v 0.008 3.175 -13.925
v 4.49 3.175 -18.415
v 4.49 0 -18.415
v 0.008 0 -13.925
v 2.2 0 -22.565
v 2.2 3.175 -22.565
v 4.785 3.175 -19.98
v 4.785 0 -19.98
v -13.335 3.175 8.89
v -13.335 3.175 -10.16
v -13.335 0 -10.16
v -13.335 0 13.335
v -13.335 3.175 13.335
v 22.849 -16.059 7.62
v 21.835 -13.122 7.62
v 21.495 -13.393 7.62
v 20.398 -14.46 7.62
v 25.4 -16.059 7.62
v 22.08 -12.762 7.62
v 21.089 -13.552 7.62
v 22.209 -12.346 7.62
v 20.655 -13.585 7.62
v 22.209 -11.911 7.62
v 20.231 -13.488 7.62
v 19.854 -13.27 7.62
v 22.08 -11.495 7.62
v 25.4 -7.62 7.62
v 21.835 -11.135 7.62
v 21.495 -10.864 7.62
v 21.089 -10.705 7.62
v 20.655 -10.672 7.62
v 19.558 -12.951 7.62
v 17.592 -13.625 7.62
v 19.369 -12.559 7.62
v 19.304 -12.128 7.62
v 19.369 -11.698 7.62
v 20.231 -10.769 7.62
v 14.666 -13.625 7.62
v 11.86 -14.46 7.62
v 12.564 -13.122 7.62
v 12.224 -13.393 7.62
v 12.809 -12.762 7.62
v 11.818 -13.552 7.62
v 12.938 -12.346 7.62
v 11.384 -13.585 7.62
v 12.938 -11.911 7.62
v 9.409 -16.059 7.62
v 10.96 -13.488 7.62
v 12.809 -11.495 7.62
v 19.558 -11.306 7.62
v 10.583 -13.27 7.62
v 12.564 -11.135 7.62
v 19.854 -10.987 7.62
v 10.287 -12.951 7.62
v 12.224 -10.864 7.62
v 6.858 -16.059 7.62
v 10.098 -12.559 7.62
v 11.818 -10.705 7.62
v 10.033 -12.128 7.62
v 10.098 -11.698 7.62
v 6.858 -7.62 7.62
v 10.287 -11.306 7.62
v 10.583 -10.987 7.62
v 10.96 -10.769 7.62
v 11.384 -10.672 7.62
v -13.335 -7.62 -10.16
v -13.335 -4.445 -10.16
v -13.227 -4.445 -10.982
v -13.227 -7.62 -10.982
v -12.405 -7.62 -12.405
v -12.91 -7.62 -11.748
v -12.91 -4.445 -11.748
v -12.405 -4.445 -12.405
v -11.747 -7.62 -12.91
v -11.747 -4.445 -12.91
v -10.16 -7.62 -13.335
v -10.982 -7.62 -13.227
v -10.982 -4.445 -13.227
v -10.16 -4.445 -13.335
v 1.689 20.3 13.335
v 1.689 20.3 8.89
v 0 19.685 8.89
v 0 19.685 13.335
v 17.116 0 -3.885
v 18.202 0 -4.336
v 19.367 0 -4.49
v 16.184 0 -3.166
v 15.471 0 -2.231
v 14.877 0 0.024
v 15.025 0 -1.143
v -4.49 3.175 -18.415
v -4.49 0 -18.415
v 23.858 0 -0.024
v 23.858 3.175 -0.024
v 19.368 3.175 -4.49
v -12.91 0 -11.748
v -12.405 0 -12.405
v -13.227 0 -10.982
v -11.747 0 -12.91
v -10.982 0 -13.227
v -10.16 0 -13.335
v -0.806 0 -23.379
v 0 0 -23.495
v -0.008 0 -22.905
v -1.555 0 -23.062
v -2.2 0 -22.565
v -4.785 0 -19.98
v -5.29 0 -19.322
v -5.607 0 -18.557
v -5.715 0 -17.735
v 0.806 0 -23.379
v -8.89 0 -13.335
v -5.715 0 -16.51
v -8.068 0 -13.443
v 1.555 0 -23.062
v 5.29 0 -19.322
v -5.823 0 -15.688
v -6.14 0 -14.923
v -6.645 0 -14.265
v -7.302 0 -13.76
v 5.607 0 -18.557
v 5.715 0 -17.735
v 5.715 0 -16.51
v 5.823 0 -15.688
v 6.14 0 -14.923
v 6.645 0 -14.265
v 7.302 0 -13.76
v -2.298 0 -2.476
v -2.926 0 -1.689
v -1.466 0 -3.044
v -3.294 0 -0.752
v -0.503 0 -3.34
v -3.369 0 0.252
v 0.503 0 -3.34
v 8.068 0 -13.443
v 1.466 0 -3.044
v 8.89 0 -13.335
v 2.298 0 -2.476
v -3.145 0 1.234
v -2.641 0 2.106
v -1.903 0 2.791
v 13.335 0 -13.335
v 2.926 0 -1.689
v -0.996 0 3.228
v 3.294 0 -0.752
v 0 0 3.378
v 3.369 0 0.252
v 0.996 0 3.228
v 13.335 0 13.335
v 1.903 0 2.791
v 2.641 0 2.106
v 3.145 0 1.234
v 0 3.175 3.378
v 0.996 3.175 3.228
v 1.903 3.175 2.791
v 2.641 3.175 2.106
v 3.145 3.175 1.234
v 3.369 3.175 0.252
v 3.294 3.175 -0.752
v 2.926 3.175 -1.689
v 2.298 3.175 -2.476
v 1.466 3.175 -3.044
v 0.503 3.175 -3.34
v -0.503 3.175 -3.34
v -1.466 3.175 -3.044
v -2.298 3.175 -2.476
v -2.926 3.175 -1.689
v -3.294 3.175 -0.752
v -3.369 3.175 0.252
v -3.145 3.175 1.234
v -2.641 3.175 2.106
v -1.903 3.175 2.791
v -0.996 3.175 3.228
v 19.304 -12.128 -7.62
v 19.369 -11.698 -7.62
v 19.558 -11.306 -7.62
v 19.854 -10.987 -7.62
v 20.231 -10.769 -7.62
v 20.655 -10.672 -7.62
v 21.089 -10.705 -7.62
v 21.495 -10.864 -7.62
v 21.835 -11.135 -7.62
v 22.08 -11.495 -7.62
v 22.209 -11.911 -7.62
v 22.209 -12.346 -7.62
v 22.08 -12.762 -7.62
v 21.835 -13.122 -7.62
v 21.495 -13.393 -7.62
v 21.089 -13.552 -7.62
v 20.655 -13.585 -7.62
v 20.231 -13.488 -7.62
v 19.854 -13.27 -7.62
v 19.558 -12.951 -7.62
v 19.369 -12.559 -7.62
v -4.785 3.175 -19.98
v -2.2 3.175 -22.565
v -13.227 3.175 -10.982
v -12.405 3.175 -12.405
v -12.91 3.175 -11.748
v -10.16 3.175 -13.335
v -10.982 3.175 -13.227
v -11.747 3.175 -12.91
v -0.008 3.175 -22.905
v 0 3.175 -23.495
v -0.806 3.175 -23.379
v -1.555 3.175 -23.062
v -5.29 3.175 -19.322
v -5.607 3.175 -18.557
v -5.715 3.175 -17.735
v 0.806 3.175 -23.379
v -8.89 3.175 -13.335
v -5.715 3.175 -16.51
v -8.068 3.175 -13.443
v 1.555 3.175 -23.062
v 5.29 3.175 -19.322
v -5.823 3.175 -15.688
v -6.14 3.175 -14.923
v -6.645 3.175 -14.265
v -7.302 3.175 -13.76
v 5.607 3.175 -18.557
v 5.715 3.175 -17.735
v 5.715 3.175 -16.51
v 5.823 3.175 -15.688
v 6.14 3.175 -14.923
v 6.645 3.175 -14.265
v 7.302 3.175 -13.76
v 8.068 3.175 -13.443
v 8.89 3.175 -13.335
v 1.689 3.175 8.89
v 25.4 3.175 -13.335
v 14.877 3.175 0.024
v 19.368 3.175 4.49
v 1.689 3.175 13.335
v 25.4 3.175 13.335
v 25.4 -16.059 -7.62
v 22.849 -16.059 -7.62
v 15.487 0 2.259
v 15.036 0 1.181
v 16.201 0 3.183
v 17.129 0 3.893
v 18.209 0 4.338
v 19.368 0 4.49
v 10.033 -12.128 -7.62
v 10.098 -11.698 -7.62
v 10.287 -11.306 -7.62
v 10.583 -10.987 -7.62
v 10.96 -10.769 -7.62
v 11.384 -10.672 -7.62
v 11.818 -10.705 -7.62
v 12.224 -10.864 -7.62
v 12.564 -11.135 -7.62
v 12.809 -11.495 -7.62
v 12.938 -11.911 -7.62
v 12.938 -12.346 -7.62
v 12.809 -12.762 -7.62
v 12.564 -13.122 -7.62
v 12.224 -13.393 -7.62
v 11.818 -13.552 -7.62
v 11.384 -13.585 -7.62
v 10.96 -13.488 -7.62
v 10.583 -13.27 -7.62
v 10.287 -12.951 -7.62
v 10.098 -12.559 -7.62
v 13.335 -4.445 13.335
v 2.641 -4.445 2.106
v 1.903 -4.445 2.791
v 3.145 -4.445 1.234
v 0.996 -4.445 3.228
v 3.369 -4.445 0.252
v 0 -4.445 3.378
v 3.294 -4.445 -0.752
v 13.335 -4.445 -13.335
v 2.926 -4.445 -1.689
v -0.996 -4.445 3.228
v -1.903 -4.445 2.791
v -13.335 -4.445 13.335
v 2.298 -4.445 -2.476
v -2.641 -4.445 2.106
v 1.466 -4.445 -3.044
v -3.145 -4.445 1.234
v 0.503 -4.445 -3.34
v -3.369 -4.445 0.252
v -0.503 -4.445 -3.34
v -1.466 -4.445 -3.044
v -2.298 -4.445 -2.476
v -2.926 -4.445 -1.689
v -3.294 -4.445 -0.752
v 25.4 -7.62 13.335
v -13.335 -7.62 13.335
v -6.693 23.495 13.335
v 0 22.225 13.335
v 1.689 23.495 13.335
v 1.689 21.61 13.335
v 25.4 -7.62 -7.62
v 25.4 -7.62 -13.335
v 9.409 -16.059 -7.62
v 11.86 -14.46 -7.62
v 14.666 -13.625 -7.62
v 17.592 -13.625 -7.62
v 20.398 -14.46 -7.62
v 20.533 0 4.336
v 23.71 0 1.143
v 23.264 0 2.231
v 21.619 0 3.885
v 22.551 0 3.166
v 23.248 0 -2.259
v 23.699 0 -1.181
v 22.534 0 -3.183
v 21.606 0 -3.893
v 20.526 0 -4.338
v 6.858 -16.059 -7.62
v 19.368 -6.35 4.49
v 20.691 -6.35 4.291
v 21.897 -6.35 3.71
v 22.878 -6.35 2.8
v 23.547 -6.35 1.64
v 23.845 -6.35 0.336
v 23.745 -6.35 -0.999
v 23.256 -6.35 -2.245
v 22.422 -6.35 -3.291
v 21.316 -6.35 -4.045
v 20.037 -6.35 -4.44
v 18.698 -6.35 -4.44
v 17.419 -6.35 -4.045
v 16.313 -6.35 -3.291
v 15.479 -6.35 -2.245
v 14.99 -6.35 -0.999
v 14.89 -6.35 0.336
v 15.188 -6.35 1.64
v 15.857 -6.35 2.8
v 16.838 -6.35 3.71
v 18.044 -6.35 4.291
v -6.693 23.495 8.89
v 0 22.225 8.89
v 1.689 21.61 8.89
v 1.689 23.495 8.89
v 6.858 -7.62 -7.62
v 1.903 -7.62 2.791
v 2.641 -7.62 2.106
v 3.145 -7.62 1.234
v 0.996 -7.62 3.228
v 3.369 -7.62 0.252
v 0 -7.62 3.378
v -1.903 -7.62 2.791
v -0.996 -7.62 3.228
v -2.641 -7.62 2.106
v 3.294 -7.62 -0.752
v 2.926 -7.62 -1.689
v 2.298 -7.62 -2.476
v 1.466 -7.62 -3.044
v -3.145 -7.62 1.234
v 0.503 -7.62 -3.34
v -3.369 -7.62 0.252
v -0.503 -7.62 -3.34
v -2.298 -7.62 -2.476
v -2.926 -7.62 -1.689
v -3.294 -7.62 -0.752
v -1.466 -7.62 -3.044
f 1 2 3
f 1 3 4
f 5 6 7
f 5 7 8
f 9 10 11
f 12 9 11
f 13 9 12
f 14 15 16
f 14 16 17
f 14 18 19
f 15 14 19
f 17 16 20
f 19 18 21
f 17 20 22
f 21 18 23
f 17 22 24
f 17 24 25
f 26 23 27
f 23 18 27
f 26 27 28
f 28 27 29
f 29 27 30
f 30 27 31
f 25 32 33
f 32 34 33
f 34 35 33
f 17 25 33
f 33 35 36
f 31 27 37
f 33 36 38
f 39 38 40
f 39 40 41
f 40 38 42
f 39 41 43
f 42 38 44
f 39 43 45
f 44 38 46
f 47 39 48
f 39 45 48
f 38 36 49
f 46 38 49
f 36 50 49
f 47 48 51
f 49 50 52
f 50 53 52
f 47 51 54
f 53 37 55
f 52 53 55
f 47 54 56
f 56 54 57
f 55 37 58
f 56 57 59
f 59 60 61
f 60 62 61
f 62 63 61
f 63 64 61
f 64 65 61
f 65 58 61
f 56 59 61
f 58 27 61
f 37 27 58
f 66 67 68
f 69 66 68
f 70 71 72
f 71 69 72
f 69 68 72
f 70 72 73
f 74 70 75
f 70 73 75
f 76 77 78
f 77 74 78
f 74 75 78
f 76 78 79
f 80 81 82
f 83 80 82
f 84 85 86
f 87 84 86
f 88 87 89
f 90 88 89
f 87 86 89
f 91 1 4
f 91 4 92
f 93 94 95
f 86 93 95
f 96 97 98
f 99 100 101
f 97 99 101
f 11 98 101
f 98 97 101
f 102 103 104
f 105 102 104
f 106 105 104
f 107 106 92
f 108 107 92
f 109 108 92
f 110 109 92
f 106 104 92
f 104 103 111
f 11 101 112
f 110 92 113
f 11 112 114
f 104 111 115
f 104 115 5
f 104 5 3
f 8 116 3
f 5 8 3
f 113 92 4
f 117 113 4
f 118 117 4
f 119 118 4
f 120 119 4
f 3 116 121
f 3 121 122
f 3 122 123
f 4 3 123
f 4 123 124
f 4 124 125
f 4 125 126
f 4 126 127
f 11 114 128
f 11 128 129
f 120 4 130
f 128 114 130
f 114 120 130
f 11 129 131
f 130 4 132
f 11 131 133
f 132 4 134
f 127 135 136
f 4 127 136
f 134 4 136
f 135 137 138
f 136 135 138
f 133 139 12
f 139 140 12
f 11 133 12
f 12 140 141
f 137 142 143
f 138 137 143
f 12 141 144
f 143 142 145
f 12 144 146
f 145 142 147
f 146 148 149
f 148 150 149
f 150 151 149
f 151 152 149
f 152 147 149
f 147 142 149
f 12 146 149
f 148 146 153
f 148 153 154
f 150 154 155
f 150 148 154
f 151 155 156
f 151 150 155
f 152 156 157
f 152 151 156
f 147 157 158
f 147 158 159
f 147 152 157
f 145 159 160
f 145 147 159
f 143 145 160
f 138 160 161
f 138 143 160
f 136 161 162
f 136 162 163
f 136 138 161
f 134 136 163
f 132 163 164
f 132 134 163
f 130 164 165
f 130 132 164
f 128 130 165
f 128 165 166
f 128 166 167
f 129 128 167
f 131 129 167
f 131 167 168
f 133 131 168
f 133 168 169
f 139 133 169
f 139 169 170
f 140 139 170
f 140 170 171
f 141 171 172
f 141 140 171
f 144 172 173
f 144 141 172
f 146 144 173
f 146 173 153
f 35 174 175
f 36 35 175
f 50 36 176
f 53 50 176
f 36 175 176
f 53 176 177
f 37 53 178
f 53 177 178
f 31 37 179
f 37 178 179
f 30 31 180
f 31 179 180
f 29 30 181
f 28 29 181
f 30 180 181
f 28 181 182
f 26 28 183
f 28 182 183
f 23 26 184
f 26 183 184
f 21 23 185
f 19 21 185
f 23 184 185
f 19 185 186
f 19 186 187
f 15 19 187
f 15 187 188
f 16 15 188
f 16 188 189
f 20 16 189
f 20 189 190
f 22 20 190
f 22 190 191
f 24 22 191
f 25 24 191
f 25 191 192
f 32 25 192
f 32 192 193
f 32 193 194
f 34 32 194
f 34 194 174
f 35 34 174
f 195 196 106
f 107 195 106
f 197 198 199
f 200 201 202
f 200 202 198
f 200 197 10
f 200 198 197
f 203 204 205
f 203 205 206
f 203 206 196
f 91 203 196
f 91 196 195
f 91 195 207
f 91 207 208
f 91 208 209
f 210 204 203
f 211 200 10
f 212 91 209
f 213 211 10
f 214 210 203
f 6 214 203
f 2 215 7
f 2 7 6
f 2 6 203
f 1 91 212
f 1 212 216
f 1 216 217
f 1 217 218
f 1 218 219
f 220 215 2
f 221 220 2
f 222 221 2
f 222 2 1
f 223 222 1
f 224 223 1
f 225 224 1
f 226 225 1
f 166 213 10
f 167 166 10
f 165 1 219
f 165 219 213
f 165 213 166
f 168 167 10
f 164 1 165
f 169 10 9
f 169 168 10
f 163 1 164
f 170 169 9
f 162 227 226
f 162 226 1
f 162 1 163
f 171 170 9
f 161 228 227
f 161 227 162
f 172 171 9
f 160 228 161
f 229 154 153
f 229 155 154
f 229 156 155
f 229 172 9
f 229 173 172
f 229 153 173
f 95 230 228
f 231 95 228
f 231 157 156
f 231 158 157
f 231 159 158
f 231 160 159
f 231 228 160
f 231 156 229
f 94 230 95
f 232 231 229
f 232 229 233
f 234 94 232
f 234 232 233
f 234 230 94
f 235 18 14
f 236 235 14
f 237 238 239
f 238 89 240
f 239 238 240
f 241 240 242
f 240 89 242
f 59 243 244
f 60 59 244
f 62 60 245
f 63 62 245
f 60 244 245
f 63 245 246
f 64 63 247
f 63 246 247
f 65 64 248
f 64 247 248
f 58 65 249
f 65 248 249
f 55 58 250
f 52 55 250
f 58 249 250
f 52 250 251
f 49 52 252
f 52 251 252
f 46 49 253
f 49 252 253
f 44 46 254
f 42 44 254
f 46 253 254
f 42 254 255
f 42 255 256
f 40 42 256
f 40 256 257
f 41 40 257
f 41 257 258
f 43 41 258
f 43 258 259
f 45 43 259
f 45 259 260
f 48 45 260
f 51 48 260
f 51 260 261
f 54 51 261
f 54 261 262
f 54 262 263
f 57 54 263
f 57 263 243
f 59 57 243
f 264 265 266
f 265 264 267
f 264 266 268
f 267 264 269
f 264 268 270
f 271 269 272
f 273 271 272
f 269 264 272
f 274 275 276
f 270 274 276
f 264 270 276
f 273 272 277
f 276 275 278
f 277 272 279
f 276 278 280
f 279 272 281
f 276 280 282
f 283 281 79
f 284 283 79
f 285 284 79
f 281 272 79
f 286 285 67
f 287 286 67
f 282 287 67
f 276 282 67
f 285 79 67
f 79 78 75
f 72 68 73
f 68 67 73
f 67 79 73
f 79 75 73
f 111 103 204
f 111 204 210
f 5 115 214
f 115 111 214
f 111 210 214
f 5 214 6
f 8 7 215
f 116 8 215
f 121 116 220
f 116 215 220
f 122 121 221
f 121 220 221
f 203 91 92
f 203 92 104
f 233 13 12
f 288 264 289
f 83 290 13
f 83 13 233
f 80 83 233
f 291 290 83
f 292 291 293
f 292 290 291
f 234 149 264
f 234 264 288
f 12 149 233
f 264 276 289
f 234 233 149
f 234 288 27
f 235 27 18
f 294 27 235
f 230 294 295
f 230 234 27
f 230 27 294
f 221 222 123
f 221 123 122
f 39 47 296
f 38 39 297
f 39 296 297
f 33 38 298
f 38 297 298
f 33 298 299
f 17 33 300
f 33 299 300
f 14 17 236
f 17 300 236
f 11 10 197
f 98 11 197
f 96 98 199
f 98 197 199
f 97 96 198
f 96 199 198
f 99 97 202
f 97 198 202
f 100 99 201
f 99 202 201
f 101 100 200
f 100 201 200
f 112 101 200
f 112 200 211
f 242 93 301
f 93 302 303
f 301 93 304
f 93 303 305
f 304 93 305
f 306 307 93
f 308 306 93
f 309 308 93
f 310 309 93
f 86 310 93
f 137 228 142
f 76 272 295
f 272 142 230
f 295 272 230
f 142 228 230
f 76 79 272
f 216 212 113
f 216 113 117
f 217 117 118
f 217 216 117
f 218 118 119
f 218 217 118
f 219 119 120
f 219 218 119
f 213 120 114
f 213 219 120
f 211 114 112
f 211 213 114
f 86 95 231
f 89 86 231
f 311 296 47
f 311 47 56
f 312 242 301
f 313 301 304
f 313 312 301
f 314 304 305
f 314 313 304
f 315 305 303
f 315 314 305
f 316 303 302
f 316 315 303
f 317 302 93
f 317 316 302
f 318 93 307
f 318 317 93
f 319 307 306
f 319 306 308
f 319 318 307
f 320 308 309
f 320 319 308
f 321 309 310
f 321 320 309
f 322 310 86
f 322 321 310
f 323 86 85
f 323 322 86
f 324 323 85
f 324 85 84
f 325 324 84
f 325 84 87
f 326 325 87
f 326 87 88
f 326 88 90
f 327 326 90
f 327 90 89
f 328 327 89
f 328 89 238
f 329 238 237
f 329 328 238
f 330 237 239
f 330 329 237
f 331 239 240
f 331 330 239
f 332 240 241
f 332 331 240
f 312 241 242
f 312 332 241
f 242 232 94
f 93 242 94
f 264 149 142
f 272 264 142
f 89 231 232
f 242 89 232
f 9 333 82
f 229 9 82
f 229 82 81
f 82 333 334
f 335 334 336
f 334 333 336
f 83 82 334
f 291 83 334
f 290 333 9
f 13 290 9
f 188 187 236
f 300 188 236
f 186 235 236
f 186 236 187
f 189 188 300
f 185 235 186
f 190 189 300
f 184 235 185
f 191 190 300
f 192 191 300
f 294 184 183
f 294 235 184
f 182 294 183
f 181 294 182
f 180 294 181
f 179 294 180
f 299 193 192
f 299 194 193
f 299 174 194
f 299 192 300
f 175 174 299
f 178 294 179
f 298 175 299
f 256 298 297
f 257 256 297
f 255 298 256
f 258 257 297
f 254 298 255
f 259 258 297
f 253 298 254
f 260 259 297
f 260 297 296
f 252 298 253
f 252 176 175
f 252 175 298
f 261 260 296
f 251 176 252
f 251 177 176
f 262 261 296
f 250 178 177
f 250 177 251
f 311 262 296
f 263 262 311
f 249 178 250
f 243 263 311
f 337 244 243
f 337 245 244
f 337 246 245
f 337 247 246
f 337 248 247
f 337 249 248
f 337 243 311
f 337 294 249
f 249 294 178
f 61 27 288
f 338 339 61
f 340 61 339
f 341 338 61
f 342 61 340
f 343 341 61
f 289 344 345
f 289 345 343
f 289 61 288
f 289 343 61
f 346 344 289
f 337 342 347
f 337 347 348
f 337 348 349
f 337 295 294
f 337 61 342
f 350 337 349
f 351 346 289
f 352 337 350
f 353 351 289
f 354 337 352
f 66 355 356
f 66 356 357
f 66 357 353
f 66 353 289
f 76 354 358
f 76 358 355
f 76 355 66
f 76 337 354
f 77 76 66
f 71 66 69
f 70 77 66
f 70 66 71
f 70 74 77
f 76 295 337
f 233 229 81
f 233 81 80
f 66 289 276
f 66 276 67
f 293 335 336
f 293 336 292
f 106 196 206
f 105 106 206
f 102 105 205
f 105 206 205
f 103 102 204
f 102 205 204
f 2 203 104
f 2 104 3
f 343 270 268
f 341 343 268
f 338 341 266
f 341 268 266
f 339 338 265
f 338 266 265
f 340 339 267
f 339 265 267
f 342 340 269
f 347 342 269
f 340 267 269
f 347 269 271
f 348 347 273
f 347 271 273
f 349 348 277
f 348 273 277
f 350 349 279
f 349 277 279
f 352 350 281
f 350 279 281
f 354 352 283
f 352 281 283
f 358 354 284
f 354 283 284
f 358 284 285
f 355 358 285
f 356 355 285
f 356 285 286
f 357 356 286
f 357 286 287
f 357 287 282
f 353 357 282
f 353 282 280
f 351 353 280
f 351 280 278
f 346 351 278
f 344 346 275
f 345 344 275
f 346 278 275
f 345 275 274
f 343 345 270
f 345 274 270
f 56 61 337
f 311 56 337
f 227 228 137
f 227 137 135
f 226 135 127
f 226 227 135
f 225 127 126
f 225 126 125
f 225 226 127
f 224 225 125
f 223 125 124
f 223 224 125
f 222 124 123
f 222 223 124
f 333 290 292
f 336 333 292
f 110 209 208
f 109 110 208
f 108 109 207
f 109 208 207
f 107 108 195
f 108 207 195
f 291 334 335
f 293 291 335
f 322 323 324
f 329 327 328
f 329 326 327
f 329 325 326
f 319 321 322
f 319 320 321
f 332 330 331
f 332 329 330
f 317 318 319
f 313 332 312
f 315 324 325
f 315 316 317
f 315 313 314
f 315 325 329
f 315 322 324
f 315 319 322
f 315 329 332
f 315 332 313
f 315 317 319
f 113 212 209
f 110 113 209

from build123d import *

# Parameters (mm, degrees)
SKETCH1_R            = 3.3782
BOSS_EXTRUDE1_DEPTH  = 3.175
BOSS_EXTRUDE2_DEPTH  = 4.445
SKETCH7_W            = 18.542
SKETCH7_H            = 15.24
BOSS_EXTRUDE4_DEPTH  = 8.43915
SKETCH8_R            = 1.4605
CUT_EXTRUDE3_DEPTH   = 37.635615509
SKETCH9_R            = 10.16
CUT_EXTRUDE4_DEPTH   = 37.635615509
CUT_EXTRUDE6_DEPTH   = 9.525
SKETCH23_R           = 4.490128061
CUT_EXTRUDE7_DEPTH   = 6.35
BOSS_EXTRUDE10_DEPTH = 3.175
BOSS_EXTRUDE11_DEPTH = 3.175
SKETCH19_W           = 8.382
SKETCH19_H           = 4.445
BOSS_EXTRUDE12_DEPTH = 20.32
BOSS_EXTRUDE13_DEPTH = 4.445
CUT_EXTRUDE5_DEPTH   = 12.7
SKETCH24_W           = 48.736365122
SKETCH24_H           = 10.862134757
CUT_EXTRUDE8_DEPTH   = 30.48
SKETCH26_W           = 11.43
SKETCH26_H           = 10.16
BOSS_EXTRUDE15_DEPTH = 3.175
CHAMFER1_SIZE        = 4.445
FILLET1_R            = 3.175


with BuildPart() as part:
    # Sketch1 → Boss-Extrude1 (new body)
    with BuildSketch(Plane(origin=(0, 0, 0), x_dir=(1, 0, 0), z_dir=(0, 1, 0))):
        with BuildLine():
            Line((0, -13.335), (25.4, -13.335))
            Line((25.4, -13.335), (25.4, 13.335))
            Line((25.4, 13.335), (0, 13.335))
            ThreePointArc((0, 13.335), (-13.335, 0), (0, -13.335))
        make_face()
        with Locations(Location((0, 0, 0), (0, 0, 270))):
            Circle(SKETCH1_R, mode=Mode.SUBTRACT)
    boss_extrude1 = extrude(amount=BOSS_EXTRUDE1_DEPTH)

    # Sketch2 → Boss-Extrude2 (add)
    with BuildSketch(Plane(origin=(0, 0, 0), x_dir=(-1, 0, 0), z_dir=(0, -1, 0))):
        Polygon((-25.4, 13.335), (-25.4, -13.335), (-13.335, -13.335), (-13.335, 0), (-13.335, 13.335), align=None)
    extrude(amount=BOSS_EXTRUDE2_DEPTH)

    # Mirror2: Boss-Extrude1 across plane
    add(boss_extrude1.mirror(Plane(origin=(0, -2.2225, 0), x_dir=(0, 0, 1), z_dir=(0, -1, 0))))

    # Sketch7 → Boss-Extrude4 (add)
    with BuildSketch(Plane(origin=(0, -7.62, 0), x_dir=(-1, 0, 0), z_dir=(0, -1, 0))):
        with Locations((-16.129, 0)):
            Rectangle(SKETCH7_W, SKETCH7_H)
    extrude(amount=BOSS_EXTRUDE4_DEPTH)

    # Sketch8 → Cut-Extrude3 (cut, through all)
    with BuildSketch(Plane(origin=(0, 0, -7.62), x_dir=(-1, 0, 0), z_dir=(0, 0, -1))):
        with Locations((-20.7645, -12.1285)):
            Circle(SKETCH8_R)
        with Locations((-11.4935, -12.1285)):
            Circle(SKETCH8_R)
    extrude(amount=-CUT_EXTRUDE3_DEPTH, mode=Mode.SUBTRACT)

    # Sketch9 → Cut-Extrude4 (cut, through all)
    with BuildSketch(Plane(origin=(0, 0, -7.62), x_dir=(-1, 0, 0), z_dir=(0, 0, -1))):
        with Locations((-16.129, -23.67915)):
            Circle(SKETCH9_R)
    extrude(amount=-CUT_EXTRUDE4_DEPTH, mode=Mode.SUBTRACT)

    # Sketch22 → Cut-Extrude6 (cut)
    with BuildSketch(Plane(origin=(0, 3.175, 0), x_dir=(1, 0, 0), z_dir=(0, 1, 0))):
        Polygon((19.3675, -4.490128061), (23.857563833, 0.024016226), (19.3675, 4.490128061), (14.877436167, -0.024016226), align=None)
    extrude(amount=-CUT_EXTRUDE6_DEPTH, mode=Mode.SUBTRACT)

    # Sketch23 → Cut-Extrude7 (cut)
    with BuildSketch(Plane(origin=(0, -6.35, 0), x_dir=(1, 0, 0), z_dir=(0, 1, 0))):
        with Locations(Location((19.3675, 0, 0), (0, 0, 270))):
            Circle(SKETCH23_R)
    extrude(amount=CUT_EXTRUDE7_DEPTH, mode=Mode.SUBTRACT)

    # Sketch16 → Boss-Extrude10 (add)
    with BuildSketch(Plane(origin=(0, 3.175, 0), x_dir=(1, 0, 0), z_dir=(0, 1, 0))):
        Polygon((0, 13.335), (-13.335, 0), (-13.335, 13.335), align=None)
    boss_extrude10 = extrude(amount=-BOSS_EXTRUDE10_DEPTH)

    # Sketch17 → Boss-Extrude11 (add)
    with BuildSketch(Plane.XZ.offset(7.62)):
        Polygon((-13.335, -13.335), (-13.335, 0), (0, -13.335), align=None)
    boss_extrude11 = extrude(amount=-BOSS_EXTRUDE11_DEPTH)

    # Sketch19 → Boss-Extrude12 (add)
    with BuildSketch(Plane(origin=(0, 3.175, 0), x_dir=(1, 0, 0), z_dir=(0, 1, 0))):
        with Locations((-2.5019, 11.1125)):
            Rectangle(SKETCH19_W, SKETCH19_H)
    boss_extrude12 = extrude(amount=BOSS_EXTRUDE12_DEPTH)

    # Sketch20 → Boss-Extrude13 (add)
    with BuildSketch(Plane.XY.offset(-8.89)):
        Polygon((-6.6929, 23.495), (-13.335, 3.175), (-6.6929, 3.175), align=None)
    boss_extrude13 = extrude(amount=-BOSS_EXTRUDE13_DEPTH)

    # Sketch21 → Cut-Extrude5 (cut)
    with BuildSketch(Plane.XY.offset(-8.89)):
        Polygon((0, 22.225), (1.6891, 21.610217877), (1.6891, 20.299782123), (0, 19.685), align=None)
    cut_extrude5 = extrude(amount=-CUT_EXTRUDE5_DEPTH, mode=Mode.SUBTRACT)

    # Mirror3: Boss-Extrude10, Boss-Extrude11, Boss-Extrude12, Boss-Extrude13, Cut-Extrude5 across plane
    add(boss_extrude10.mirror(Plane.XY))
    add(boss_extrude11.mirror(Plane.XY))
    add(boss_extrude12.mirror(Plane.XY))
    add(boss_extrude13.mirror(Plane.XY))
    add(cut_extrude5.mirror(Plane.XY), mode=Mode.SUBTRACT)

    # Sketch24 → Cut-Extrude8 (cut)
    with BuildSketch(Plane(origin=(0, 3.175, 0), x_dir=(1, 0, 0), z_dir=(0, 1, 0))):
        with Locations((2.598122841, 11.203809408)):
            Rectangle(SKETCH24_W, SKETCH24_H)
    extrude(amount=CUT_EXTRUDE8_DEPTH, mode=Mode.SUBTRACT)

    # Sketch26 → Boss-Extrude15 (add)
    with BuildSketch(Plane(origin=(0, 3.175, 0), x_dir=(1, 0, 0), z_dir=(0, 1, 0))):
        with Locations((0, 18.415)):
            Rectangle(SKETCH26_W, SKETCH26_H)
        Polygon((4.490128061, 18.415), (0.007864628, 13.924878827), (-4.490128061, 18.415), (-0.007864628, 22.905121173), align=None, mode=Mode.SUBTRACT)
    extrude(amount=-BOSS_EXTRUDE15_DEPTH)

    # Chamfer1
    chamfer1_edges = [part.edges().sort_by_distance(p)[0] for p in [
        (5.715, 1.5875, -23.495),
        (-5.715, 1.5875, -23.495),
    ]]
    chamfer(chamfer1_edges, length=CHAMFER1_SIZE)

    # Fillet1
    # the kernel refuses this fillet: 3.175 mm, written as the material it adds along each edge
    with BuildSketch(Plane(origin=(-5.715, 3.175, -13.335), x_dir=(0, 0, -1), z_dir=(0, -1, 0))) as fillet1_piece_1:
        with BuildLine():
            CenterArc((FILLET1_R, -FILLET1_R), FILLET1_R, 90, 90)
            Line((0, -FILLET1_R), (0, 0))
            Line((0, 0), (FILLET1_R, 0))
        make_face()
    extrude(amount=3.175)
    with BuildSketch(Plane(origin=(5.715, 3.175, -13.335), x_dir=(0, 0, -1), z_dir=(0, -1, 0))) as fillet1_piece_2:
        with BuildLine():
            CenterArc((FILLET1_R, FILLET1_R), FILLET1_R, 180, 90)
            Line((0, FILLET1_R), (0, 0))
            Line((0, 0), (FILLET1_R, 0))
        make_face()
    extrude(amount=3.175)
    # the kernel refuses this fillet: 3.175 mm, written as the material it takes off along each edge
    with BuildSketch(Plane(origin=(-13.335, 11.1125, -13.335), x_dir=(1, 0, 0), z_dir=(0, -1, 0))) as fillet1_2_piece_1:
        with BuildLine():
            CenterArc((FILLET1_R, FILLET1_R), FILLET1_R, 180, 90)
            Line((0, FILLET1_R), (0, 0))
            Line((0, 0), (FILLET1_R, 0))
        make_face()
    extrude(amount=19.05, mode=Mode.SUBTRACT)
    with BuildSketch(Plane(origin=(-13.335, -15.5575, -13.335), x_dir=(1, 0, 0), z_dir=(0, 1, 0))) as fillet1_2_piece_2:
        with BuildLine():
            CenterArc((FILLET1_R, -FILLET1_R), FILLET1_R, 90, 90)
            Line((0, -FILLET1_R), (0, 0))
            Line((0, 0), (FILLET1_R, 0))
        make_face()
    extrude(amount=19.05, mode=Mode.SUBTRACT)
    with BuildSketch(Plane(origin=(-1.27, 6.462820151, -23.495), x_dir=(1, 0, 0), z_dir=(0, -1, 0)), Plane(origin=(-5.715, 6.462820151, -19.05), x_dir=(0.7071067811865476, 0, -0.7071067811865476), z_dir=(0, -1, 0)), Plane(origin=(1.27, 6.462820151, -23.495), x_dir=(0.7071067811865479, 0, 0.7071067811865472), z_dir=(0, -1, 0)), Plane(origin=(5.715, 6.462820151, -19.05), x_dir=(0, 0, 1), z_dir=(0, -1, 0))) as fillet1_2_piece_3:
        with BuildLine():
            CenterArc((FILLET1_R * 0.414213562373, FILLET1_R), FILLET1_R, 225, 45)
            Line((-FILLET1_R * 0.292893218813, FILLET1_R * 0.292893218813), (0, 0))
            Line((0, 0), (FILLET1_R * 0.414213562373, 0))
        make_face()
    extrude(amount=9.750640303, mode=Mode.SUBTRACT)


solid = part.part
